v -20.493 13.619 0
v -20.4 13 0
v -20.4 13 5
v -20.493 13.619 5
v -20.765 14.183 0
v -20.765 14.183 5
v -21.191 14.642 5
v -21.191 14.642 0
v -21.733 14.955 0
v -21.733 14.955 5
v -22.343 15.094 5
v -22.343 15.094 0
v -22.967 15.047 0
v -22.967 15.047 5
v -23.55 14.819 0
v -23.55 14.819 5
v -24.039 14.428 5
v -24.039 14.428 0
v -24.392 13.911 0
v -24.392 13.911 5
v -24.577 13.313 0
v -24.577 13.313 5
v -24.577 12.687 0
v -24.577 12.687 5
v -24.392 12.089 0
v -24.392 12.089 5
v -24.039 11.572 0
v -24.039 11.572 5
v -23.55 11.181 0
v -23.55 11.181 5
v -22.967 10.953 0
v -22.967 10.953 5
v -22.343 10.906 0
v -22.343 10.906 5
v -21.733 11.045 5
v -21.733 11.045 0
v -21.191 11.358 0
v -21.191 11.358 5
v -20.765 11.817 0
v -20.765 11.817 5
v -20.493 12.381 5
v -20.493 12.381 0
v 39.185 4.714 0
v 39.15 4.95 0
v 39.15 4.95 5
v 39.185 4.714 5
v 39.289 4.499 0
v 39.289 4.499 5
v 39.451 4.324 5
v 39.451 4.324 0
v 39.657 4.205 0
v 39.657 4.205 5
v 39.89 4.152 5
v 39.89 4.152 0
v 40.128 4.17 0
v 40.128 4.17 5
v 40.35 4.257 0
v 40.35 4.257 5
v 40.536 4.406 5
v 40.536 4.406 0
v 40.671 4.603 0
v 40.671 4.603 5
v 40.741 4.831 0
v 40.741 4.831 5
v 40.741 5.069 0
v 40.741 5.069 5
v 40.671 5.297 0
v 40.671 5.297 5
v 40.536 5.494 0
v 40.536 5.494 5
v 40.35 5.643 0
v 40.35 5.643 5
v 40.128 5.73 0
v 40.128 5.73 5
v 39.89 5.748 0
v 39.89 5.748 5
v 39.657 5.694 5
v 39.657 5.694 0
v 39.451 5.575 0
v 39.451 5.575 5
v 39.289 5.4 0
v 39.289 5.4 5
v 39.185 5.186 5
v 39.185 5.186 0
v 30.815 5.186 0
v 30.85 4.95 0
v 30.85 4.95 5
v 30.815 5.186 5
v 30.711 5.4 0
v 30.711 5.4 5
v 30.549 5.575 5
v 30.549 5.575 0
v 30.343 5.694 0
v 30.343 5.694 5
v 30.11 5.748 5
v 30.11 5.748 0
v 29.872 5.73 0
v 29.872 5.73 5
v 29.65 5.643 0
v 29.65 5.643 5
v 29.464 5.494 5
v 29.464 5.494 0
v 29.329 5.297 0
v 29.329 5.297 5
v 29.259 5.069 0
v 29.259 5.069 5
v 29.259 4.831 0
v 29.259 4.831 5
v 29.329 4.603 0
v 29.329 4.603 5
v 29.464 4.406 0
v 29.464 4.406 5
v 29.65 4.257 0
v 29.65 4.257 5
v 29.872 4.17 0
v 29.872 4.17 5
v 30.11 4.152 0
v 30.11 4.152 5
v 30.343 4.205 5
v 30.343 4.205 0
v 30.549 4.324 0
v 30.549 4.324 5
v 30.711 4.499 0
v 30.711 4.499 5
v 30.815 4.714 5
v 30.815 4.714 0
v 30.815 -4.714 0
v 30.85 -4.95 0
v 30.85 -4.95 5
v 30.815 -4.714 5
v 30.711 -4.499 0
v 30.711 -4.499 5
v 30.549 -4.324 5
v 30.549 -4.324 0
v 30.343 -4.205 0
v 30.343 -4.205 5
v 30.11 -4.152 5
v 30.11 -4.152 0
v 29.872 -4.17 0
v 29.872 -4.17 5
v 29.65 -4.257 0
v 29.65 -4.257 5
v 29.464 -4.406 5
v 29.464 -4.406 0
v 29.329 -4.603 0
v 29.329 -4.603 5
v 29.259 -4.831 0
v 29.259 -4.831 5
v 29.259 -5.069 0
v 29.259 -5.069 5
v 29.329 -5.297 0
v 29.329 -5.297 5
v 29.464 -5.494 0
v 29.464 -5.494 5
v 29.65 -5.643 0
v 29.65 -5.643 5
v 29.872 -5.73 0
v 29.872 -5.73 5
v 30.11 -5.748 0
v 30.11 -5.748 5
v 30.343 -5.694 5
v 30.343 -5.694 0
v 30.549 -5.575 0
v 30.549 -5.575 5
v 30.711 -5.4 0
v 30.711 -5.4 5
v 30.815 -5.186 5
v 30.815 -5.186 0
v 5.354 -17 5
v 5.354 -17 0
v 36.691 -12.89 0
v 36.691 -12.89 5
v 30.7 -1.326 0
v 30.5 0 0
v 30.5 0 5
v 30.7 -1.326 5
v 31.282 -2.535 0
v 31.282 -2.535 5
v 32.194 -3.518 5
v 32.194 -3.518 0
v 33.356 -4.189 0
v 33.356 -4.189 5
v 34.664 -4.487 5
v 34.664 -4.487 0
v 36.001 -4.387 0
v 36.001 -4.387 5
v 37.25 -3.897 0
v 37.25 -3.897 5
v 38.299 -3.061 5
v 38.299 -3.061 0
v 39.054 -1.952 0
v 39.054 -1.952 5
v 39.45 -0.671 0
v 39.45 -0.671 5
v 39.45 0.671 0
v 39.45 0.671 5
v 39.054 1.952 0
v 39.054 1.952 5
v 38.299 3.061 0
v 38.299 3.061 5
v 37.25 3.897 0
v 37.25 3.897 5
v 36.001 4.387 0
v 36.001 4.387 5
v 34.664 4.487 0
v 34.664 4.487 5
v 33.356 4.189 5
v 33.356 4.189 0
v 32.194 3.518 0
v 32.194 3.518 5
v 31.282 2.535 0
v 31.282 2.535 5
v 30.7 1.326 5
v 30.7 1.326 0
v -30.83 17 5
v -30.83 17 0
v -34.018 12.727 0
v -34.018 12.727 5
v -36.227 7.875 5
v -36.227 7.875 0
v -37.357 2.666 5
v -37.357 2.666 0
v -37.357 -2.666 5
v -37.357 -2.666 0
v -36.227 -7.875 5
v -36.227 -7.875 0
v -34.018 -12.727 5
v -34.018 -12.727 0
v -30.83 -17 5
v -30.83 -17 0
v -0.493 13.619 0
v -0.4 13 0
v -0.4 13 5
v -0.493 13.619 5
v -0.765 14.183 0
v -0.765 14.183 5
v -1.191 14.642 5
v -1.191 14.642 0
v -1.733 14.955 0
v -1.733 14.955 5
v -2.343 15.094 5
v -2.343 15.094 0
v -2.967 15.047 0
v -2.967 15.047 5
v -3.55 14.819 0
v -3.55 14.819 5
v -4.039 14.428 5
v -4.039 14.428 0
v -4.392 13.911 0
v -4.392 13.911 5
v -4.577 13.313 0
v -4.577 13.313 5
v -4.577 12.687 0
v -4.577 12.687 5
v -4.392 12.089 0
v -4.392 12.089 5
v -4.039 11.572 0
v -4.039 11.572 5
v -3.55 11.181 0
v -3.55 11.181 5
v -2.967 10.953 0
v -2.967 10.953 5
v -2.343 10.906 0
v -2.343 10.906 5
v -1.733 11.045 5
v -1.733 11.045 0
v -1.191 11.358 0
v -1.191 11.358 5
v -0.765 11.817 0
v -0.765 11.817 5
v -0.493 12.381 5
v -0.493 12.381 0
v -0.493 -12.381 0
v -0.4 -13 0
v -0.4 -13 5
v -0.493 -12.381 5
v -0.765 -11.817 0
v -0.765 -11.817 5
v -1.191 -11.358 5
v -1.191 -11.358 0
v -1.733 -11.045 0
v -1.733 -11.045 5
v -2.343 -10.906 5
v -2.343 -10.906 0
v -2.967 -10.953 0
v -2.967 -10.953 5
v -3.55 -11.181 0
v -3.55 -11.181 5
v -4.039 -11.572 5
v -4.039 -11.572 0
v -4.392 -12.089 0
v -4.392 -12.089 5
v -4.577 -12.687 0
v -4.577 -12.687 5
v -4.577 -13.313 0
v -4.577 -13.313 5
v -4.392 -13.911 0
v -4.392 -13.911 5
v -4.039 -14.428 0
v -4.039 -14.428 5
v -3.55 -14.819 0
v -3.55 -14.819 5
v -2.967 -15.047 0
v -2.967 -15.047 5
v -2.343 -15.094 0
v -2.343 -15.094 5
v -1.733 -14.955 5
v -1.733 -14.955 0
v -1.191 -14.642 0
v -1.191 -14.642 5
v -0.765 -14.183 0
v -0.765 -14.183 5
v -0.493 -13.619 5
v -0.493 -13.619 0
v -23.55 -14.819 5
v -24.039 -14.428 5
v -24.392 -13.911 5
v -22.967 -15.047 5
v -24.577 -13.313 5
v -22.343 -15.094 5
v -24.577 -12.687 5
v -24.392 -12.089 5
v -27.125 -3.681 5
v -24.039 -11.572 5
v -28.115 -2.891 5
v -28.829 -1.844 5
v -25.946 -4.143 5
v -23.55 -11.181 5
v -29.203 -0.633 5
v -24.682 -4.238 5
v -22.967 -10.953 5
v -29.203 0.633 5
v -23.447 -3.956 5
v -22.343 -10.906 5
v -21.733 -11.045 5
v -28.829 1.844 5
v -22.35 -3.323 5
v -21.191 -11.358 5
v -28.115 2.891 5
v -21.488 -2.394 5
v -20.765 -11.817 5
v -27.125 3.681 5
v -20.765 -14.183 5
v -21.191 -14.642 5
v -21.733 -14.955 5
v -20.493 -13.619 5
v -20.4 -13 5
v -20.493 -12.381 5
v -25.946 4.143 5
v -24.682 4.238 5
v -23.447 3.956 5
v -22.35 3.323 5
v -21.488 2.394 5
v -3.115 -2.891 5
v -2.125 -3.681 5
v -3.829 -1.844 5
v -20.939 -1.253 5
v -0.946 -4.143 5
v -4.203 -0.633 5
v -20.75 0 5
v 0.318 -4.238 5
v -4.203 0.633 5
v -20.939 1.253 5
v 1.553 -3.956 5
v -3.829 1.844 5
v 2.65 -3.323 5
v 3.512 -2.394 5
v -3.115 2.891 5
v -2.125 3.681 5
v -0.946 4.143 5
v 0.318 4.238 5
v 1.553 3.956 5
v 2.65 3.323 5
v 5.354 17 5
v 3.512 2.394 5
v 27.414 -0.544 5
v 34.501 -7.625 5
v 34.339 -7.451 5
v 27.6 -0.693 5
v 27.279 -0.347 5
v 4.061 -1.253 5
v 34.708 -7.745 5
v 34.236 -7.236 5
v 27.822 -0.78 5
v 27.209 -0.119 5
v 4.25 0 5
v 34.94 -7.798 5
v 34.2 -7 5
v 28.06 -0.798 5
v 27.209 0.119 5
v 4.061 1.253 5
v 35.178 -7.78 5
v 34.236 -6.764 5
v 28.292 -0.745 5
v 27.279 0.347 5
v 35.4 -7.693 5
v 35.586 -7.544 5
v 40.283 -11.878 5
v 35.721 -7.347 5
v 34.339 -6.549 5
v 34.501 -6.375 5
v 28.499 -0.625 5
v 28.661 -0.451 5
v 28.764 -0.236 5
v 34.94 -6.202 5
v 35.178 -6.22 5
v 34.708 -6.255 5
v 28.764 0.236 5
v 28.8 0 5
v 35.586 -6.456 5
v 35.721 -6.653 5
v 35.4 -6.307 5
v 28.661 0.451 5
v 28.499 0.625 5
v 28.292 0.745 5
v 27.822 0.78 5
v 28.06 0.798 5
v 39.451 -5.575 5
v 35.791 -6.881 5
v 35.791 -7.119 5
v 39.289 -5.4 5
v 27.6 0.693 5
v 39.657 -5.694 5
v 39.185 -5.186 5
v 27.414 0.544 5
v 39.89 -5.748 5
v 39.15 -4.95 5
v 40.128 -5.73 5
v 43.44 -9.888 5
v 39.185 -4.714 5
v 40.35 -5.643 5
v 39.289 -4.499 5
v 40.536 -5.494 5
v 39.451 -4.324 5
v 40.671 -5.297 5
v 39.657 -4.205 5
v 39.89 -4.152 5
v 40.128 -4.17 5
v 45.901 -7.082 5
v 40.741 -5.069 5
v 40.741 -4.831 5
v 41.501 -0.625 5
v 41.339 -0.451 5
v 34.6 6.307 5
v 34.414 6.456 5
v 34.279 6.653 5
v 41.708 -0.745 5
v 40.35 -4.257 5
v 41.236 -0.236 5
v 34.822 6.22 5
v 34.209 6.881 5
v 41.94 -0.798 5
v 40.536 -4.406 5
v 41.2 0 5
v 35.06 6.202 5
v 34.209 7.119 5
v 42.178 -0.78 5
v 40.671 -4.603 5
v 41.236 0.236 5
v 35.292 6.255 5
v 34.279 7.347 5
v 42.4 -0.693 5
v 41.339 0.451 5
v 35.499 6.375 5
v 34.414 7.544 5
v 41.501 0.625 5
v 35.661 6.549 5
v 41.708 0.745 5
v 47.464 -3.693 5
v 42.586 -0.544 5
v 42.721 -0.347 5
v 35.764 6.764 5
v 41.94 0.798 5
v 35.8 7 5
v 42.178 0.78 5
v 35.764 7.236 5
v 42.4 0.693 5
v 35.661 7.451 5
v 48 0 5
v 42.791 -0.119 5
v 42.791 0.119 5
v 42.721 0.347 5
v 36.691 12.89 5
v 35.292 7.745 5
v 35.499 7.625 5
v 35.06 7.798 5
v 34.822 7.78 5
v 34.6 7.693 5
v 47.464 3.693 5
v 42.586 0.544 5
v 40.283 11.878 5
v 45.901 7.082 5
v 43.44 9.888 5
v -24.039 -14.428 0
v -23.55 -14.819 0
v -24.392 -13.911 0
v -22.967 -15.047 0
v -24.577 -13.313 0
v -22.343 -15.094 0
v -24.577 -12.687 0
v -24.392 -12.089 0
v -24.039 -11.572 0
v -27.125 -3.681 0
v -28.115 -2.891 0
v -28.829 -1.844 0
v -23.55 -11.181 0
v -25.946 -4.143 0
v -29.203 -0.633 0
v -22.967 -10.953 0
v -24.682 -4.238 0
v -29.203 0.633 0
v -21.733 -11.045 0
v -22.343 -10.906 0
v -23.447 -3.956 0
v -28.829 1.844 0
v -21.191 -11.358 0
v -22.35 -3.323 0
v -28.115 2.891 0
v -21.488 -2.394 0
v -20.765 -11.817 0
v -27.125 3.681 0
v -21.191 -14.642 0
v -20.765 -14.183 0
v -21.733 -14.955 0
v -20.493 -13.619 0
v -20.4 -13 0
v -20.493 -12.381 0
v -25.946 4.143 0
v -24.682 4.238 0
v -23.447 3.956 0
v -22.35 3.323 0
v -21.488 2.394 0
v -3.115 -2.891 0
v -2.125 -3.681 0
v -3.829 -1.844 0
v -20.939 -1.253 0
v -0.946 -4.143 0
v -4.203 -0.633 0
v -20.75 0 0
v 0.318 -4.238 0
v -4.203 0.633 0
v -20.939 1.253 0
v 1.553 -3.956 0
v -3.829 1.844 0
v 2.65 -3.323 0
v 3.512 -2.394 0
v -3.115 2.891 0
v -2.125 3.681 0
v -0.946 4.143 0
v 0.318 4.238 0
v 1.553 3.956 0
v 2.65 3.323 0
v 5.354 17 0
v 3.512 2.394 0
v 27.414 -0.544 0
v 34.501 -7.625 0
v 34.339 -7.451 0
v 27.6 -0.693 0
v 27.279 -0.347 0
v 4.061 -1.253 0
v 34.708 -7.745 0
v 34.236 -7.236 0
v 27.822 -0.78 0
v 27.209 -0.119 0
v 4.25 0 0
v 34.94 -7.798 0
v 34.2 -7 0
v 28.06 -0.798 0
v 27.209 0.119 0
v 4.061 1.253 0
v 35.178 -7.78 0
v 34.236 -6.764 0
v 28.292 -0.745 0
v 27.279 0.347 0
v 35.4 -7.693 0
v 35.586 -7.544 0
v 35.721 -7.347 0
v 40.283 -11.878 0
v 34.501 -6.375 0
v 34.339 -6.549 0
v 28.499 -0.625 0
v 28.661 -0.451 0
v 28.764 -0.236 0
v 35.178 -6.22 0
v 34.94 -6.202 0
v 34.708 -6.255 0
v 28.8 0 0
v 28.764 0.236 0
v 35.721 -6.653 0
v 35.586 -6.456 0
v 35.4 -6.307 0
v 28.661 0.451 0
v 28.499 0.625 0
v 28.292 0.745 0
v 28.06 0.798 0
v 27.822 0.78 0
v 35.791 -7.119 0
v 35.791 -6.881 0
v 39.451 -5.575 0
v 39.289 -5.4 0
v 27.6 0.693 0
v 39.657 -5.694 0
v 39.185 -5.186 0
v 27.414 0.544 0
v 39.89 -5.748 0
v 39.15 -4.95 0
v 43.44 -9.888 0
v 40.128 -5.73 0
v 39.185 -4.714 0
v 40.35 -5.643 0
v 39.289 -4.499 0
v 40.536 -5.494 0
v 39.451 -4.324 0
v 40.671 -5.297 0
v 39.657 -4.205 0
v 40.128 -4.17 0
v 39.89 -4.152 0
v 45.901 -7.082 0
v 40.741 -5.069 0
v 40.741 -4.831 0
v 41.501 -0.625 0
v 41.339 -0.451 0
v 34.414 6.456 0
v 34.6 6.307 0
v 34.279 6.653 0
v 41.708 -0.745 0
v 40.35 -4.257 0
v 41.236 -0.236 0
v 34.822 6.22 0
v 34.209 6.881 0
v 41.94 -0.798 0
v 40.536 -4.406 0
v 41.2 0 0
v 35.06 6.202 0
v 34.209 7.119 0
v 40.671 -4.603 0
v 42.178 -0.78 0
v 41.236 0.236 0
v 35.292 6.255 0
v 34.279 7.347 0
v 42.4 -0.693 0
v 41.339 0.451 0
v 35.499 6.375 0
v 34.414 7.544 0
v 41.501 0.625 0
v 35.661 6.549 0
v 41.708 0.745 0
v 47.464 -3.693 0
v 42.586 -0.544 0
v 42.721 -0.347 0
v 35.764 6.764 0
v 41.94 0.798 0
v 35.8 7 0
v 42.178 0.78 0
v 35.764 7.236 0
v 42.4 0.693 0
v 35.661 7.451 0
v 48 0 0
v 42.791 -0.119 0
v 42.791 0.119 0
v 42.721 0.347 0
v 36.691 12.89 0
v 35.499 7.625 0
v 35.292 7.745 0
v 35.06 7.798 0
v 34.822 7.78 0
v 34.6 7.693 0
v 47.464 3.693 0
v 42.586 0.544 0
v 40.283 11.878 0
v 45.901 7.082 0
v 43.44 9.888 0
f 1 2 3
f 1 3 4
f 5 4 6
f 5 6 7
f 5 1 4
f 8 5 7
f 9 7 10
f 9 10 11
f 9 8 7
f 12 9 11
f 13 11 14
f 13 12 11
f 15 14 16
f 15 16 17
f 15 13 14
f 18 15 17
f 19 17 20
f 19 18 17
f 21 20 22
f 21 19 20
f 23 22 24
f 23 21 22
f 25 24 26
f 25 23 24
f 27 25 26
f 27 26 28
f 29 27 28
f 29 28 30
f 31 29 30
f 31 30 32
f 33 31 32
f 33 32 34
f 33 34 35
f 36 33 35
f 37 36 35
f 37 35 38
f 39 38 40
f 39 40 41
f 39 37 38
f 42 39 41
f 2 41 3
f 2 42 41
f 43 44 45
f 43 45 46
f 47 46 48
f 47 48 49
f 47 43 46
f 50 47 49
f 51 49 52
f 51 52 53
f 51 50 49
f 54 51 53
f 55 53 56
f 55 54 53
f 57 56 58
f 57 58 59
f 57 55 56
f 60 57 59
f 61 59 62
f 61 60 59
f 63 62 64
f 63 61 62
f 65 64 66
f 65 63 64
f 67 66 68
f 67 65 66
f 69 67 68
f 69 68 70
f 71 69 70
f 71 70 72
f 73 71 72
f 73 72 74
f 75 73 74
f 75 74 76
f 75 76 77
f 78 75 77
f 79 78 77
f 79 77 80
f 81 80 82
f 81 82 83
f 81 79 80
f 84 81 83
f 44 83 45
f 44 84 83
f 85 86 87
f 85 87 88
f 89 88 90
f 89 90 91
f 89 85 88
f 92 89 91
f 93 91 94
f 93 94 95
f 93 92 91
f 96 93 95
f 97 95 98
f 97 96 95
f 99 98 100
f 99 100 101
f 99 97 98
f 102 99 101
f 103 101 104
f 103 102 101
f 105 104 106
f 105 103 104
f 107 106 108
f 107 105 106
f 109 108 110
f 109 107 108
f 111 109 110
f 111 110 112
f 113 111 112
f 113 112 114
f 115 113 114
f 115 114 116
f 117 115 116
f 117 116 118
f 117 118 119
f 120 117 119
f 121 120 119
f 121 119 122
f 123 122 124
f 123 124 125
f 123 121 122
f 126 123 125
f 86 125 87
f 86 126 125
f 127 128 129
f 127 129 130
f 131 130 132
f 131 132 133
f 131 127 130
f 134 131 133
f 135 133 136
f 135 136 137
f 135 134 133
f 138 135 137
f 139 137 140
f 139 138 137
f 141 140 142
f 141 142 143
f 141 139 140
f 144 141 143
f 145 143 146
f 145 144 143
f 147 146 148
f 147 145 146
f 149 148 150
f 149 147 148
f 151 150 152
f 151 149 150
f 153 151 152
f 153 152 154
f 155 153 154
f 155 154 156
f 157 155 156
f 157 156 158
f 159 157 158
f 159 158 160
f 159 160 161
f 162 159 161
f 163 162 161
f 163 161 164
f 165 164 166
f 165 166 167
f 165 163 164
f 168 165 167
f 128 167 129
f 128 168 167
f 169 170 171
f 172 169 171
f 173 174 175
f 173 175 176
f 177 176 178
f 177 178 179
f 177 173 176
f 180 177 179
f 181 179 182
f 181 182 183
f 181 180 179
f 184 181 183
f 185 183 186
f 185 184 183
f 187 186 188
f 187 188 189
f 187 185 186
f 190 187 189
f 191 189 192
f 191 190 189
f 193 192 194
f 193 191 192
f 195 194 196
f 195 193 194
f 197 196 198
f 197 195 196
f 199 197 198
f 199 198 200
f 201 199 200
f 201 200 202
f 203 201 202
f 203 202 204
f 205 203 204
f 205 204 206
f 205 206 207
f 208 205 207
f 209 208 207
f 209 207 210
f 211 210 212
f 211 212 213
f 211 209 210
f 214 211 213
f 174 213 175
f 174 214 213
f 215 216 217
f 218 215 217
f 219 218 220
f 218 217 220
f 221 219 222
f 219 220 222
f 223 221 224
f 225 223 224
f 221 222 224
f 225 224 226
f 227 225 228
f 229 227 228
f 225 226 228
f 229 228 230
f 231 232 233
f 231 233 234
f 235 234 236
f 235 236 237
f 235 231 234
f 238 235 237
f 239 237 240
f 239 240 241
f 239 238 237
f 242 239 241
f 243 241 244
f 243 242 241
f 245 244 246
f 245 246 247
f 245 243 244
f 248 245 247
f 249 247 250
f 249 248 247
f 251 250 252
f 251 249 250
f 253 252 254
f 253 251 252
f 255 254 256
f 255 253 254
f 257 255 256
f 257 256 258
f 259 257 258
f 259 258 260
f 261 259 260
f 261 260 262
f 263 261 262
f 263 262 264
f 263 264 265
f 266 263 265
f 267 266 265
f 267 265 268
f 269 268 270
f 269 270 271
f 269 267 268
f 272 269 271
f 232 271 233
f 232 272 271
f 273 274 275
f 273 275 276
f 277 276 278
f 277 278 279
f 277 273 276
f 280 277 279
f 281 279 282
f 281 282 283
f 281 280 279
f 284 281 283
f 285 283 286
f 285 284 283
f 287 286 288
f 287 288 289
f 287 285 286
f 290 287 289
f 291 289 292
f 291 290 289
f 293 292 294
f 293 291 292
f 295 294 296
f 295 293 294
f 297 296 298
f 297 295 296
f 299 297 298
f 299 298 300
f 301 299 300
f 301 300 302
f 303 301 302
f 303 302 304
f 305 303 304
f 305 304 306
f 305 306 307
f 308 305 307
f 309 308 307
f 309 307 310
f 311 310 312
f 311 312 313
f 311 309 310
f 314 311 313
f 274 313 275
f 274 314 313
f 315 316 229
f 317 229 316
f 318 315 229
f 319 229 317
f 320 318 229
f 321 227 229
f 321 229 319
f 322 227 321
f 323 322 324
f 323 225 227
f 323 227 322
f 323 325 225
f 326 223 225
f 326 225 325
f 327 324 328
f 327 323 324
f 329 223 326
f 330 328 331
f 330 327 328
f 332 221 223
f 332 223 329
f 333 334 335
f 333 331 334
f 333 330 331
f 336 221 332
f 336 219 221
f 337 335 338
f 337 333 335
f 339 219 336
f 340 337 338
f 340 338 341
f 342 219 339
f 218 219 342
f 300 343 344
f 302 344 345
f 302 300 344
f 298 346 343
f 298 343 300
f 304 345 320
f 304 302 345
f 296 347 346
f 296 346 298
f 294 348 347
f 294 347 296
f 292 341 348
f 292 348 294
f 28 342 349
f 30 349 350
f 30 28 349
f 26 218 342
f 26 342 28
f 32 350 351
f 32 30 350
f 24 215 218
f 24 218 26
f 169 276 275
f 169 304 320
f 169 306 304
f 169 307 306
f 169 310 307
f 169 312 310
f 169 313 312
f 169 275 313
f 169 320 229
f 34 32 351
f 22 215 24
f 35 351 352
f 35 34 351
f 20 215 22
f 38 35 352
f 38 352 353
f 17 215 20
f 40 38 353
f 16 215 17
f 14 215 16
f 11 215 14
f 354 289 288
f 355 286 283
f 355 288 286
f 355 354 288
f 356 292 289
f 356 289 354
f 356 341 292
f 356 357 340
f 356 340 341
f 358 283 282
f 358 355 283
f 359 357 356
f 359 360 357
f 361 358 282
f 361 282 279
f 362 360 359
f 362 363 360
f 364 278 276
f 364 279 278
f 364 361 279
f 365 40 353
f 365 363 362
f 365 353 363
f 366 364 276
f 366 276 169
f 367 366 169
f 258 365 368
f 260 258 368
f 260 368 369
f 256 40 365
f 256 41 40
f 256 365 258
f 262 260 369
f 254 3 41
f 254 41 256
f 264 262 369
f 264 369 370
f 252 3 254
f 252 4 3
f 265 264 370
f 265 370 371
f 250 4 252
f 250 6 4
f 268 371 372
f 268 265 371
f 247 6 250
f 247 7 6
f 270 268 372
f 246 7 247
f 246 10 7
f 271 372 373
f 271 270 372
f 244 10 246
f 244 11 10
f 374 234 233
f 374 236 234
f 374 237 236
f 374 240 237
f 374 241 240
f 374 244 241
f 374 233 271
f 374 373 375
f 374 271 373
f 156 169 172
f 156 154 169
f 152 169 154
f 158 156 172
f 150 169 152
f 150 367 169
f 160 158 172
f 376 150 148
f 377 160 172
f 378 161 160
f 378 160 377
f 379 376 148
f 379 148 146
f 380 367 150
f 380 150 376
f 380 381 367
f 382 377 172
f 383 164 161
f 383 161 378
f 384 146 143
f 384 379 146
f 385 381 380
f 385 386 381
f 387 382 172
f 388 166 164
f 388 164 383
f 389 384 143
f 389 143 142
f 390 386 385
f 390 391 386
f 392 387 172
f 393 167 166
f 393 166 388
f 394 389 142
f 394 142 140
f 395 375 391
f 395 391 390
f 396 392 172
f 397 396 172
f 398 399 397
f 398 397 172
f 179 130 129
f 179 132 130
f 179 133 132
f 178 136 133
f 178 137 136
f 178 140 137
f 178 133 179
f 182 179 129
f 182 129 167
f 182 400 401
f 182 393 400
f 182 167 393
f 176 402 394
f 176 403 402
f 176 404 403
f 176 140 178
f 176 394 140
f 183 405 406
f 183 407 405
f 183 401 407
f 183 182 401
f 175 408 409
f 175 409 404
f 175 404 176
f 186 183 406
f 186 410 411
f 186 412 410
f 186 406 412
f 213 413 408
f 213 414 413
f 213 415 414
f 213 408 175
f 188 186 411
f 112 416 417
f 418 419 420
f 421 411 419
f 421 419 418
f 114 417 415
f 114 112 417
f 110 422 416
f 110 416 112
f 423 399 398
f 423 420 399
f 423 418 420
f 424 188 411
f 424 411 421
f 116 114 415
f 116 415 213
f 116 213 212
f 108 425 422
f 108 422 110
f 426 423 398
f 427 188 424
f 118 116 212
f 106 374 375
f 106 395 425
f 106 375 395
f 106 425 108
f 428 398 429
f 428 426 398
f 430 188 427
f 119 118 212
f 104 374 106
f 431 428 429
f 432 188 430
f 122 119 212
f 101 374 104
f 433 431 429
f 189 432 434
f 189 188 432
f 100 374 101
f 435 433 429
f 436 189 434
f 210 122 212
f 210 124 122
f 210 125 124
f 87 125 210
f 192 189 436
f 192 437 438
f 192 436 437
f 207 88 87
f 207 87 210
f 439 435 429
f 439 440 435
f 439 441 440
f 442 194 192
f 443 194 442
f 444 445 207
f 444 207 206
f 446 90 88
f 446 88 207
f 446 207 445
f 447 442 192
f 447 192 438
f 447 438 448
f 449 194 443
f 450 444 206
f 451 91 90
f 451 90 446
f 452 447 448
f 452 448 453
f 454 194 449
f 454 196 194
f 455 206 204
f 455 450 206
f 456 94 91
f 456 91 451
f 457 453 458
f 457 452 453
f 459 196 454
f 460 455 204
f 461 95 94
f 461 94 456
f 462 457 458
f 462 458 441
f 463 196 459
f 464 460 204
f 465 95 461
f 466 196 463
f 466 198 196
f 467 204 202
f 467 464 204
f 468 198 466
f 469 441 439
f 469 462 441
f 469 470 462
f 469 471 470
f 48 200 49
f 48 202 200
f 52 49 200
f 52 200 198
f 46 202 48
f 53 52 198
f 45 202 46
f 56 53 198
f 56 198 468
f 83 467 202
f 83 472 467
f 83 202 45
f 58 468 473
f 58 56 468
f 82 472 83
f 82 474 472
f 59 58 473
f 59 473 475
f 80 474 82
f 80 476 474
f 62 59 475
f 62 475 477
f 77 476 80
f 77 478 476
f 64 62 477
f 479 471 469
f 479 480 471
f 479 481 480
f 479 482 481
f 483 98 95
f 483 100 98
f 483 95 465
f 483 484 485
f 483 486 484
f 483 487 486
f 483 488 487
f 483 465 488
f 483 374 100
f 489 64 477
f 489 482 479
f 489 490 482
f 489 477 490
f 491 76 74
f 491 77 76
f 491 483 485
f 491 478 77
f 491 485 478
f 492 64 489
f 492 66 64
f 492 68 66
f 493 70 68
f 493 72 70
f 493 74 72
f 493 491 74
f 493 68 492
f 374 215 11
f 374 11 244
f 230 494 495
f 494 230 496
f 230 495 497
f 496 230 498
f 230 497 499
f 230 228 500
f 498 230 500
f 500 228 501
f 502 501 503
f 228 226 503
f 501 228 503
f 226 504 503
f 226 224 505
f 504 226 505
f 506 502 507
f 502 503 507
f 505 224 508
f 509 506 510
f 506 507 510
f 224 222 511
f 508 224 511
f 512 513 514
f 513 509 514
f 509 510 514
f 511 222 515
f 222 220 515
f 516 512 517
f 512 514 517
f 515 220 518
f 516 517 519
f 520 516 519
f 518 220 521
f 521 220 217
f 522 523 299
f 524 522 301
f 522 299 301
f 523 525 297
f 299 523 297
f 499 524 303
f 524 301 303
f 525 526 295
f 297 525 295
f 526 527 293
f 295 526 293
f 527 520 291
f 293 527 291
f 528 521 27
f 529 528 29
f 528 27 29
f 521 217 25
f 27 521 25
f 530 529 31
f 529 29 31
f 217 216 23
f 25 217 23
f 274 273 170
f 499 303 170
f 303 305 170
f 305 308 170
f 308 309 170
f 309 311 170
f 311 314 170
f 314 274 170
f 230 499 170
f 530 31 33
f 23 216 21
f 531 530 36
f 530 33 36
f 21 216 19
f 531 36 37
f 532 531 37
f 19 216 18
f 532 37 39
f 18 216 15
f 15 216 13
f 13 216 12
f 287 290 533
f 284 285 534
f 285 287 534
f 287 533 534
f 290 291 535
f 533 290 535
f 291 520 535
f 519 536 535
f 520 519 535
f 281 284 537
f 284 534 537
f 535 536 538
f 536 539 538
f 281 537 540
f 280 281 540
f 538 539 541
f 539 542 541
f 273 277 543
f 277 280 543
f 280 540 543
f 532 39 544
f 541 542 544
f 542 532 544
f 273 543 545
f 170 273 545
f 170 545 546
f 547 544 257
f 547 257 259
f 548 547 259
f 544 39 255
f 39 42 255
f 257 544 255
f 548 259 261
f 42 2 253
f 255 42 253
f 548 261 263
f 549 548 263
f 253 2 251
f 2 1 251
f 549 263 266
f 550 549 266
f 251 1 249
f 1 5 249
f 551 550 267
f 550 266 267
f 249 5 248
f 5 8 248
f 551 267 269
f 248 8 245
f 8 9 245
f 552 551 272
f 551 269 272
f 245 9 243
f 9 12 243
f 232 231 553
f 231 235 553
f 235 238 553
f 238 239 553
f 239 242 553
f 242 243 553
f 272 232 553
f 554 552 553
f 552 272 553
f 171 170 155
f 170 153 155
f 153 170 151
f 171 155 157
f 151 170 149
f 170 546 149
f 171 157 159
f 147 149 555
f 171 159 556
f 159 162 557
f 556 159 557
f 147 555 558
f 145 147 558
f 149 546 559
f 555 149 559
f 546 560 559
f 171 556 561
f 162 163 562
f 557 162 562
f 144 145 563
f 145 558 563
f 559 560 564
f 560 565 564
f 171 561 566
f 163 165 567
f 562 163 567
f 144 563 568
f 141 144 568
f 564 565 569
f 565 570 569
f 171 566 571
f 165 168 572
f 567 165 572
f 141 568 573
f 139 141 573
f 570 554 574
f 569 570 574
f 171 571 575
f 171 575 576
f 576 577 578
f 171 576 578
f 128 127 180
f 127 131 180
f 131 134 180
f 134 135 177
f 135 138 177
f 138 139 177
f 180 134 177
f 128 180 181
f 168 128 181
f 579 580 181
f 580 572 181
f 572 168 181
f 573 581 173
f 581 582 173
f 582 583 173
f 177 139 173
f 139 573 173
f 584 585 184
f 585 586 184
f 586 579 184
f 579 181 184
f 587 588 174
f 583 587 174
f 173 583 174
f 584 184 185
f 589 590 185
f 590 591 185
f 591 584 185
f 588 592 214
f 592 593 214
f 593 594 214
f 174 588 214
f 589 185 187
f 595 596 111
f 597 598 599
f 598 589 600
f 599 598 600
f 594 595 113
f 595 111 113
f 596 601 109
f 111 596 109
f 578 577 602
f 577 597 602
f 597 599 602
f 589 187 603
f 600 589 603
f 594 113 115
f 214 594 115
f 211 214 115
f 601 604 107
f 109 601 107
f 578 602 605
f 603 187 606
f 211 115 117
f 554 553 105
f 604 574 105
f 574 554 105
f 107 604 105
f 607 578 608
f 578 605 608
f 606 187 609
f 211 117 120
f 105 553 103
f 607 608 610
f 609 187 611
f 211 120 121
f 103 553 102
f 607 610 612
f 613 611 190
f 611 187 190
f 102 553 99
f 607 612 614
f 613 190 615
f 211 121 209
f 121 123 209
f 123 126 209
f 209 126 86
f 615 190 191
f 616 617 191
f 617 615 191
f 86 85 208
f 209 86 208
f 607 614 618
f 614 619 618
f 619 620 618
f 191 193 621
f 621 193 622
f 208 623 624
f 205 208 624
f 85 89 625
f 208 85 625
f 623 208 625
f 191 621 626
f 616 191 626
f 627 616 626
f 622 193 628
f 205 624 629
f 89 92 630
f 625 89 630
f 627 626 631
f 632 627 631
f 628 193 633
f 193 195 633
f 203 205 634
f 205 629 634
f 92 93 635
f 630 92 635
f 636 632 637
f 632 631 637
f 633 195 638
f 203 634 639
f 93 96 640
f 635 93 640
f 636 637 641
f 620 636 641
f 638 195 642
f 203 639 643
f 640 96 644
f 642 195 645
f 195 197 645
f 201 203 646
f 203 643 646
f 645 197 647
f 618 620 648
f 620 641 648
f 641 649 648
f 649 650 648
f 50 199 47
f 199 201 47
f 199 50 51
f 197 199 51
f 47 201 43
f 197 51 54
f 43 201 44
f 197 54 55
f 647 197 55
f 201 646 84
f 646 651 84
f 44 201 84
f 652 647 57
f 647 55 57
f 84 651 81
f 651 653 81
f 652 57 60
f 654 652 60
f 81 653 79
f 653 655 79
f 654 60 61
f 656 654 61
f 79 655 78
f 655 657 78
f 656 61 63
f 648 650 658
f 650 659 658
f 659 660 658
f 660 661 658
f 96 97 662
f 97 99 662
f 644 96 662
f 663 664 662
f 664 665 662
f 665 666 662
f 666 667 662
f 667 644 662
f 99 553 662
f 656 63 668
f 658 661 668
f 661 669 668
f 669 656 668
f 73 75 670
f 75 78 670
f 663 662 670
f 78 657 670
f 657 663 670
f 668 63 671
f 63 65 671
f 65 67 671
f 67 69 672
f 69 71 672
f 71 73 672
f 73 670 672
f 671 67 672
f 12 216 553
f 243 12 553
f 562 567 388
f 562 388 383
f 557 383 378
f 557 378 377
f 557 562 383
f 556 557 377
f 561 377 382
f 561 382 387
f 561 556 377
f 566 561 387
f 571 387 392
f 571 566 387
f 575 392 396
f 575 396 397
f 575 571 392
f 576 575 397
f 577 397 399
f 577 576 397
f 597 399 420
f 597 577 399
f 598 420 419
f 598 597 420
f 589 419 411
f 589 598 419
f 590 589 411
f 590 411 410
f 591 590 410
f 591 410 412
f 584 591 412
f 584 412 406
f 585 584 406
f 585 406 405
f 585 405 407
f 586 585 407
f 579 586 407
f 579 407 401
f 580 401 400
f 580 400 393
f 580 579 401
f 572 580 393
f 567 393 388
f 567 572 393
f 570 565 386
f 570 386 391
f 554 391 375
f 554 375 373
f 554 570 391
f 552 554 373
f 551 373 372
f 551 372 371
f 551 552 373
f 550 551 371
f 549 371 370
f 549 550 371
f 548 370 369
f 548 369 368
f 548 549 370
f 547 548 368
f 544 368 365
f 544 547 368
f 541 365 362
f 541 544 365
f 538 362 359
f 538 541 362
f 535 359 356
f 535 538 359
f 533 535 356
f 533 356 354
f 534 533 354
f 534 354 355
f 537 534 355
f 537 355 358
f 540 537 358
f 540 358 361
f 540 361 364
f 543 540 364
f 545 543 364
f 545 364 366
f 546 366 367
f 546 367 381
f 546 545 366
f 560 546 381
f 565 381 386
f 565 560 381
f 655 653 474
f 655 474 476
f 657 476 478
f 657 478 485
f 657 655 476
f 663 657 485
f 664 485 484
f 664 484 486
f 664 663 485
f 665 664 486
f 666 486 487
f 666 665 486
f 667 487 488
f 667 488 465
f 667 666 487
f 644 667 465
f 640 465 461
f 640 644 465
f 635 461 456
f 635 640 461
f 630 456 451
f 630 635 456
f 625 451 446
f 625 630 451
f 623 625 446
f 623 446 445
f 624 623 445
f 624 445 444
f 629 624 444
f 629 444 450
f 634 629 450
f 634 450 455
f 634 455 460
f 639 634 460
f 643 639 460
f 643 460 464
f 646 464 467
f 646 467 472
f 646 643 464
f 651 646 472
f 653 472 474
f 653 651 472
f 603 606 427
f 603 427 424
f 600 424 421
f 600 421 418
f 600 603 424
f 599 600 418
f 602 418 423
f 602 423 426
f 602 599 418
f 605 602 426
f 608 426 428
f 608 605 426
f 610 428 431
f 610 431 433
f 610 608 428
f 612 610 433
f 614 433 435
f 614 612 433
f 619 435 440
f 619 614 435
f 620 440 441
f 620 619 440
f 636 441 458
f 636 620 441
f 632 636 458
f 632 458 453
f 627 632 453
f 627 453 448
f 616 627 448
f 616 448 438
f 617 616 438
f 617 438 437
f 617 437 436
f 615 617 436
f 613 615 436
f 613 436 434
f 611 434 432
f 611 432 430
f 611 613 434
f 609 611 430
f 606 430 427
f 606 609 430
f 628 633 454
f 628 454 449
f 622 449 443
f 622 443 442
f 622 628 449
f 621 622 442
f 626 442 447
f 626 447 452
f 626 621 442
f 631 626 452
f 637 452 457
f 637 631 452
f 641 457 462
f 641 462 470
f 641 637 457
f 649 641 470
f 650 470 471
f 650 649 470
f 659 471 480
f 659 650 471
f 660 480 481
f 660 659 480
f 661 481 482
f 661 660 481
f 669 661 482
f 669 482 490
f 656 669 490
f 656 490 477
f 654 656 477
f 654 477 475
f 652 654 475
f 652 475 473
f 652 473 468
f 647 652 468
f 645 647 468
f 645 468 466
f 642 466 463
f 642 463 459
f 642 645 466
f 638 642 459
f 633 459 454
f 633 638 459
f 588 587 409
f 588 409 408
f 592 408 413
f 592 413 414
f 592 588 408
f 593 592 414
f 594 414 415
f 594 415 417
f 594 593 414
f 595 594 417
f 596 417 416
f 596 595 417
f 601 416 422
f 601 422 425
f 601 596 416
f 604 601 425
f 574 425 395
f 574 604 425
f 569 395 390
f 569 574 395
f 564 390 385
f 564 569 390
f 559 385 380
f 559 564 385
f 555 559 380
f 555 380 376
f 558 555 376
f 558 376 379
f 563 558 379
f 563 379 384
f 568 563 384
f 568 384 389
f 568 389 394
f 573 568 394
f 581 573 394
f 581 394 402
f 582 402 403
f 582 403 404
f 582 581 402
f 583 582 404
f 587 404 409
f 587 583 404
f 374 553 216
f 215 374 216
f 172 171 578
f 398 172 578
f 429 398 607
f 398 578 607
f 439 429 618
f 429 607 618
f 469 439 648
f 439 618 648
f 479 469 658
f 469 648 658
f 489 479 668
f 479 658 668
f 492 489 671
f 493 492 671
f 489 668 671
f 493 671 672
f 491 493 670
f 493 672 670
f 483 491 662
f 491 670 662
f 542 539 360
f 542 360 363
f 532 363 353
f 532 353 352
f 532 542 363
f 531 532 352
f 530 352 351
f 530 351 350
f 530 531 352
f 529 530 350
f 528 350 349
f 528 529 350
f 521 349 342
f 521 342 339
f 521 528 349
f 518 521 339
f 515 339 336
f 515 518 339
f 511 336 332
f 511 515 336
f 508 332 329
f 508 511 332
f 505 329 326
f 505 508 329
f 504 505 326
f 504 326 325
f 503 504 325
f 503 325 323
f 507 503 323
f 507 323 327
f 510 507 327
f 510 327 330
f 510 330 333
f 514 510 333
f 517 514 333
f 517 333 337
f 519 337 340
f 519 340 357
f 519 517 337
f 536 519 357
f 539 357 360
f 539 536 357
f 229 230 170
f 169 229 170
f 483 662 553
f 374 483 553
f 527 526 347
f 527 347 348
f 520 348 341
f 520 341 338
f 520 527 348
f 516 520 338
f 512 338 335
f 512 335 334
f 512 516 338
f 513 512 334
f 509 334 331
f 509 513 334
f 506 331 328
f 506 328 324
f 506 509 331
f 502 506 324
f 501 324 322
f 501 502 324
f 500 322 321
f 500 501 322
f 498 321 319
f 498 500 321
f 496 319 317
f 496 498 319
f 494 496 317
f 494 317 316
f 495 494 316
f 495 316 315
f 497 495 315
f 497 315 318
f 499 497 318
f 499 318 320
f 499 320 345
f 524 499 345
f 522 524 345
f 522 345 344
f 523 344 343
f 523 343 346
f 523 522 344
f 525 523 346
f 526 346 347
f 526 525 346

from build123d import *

# Parameters (mm, degrees)
SKETCH1_R           = 2.1
SKETCH1_R_2         = 4.25
BOSS_EXTRUDE1_DEPTH = 5


with BuildPart() as part:
    # Sketch1 → Boss-Extrude1 (new body)
    # profile 1 of 2: a face of its own
    with BuildSketch(Plane.XY):
        with BuildLine():
            Line((5.353571071, -17), (36.690694186, -12.889590884))
            ThreePointArc((36.690694186, -12.889590884), (48, 0), (36.690694186, 12.889590884))
            Line((36.690694186, 12.889590884), (5.353571071, 17))
            Line((5.353571071, 17), (-30.83030278, 17))
            ThreePointArc((-30.83030278, 17), (-37.5, 0), (-30.83030278, -17))
            Line((-30.83030278, -17), (5.353571071, -17))
        make_face()
        with Locations((-22.5, 13)):
            Circle(SKETCH1_R, mode=Mode.SUBTRACT)
        with Locations((-2.5, 13)):
            Circle(SKETCH1_R, mode=Mode.SUBTRACT)
        Circle(SKETCH1_R_2, mode=Mode.SUBTRACT)
        with Locations((-25, 0)):
            Circle(SKETCH1_R_2, mode=Mode.SUBTRACT)
        with Locations((-22.5, -13)):
            Circle(SKETCH1_R, mode=Mode.SUBTRACT)
        with Locations((-2.5, -13)):
            Circle(SKETCH1_R, mode=Mode.SUBTRACT)
        with BuildLine():
            ThreePointArc((44.5, 0), (35, 9.5), (25.5, 0))
            ThreePointArc((25.5, 0), (35, -9.5), (44.5, 0))
        make_face(mode=Mode.SUBTRACT)
    # profile 2 of 2: a face of its own
    with BuildSketch(Plane.XY):
        with BuildLine():
            ThreePointArc((25.5, 0), (35, -9.5), (44.5, 0))
            ThreePointArc((44.5, 0), (35, 9.5), (25.5, 0))
        make_face()
        with BuildLine():
            ThreePointArc((34.2, 7), (35, 6.2), (35.8, 7))
            ThreePointArc((35.8, 7), (35, 7.8), (34.2, 7))
        make_face(mode=Mode.SUBTRACT)
        with BuildLine():
            ThreePointArc((40.749747468, 4.949747468), (39.949747468, 5.749747468), (39.149747468, 4.949747468))
            ThreePointArc((39.149747468, 4.949747468), (39.949747468, 4.149747468), (40.749747468, 4.949747468))
        make_face(mode=Mode.SUBTRACT)
        with BuildLine():
            ThreePointArc((42.8, 0), (42, 0.8), (41.2, 0))
            ThreePointArc((41.2, 0), (42, -0.8), (42.8, 0))
        make_face(mode=Mode.SUBTRACT)
        with BuildLine():
            ThreePointArc((40.749747468, -4.949747468), (39.949747468, -4.149747468), (39.149747468, -4.949747468))
            ThreePointArc((39.149747468, -4.949747468), (39.949747468, -5.749747468), (40.749747468, -4.949747468))
        make_face(mode=Mode.SUBTRACT)
        with BuildLine():
            ThreePointArc((35.8, -7), (35, -6.2), (34.2, -7))
            ThreePointArc((34.2, -7), (35, -7.8), (35.8, -7))
        make_face(mode=Mode.SUBTRACT)
        with BuildLine():
            ThreePointArc((29.250252532, -4.949747468), (30.050252532, -5.749747468), (30.850252532, -4.949747468))
            ThreePointArc((30.850252532, -4.949747468), (30.050252532, -4.149747468), (29.250252532, -4.949747468))
        make_face(mode=Mode.SUBTRACT)
        with BuildLine():
            ThreePointArc((27.2, 0), (28, -0.8), (28.8, 0))
            ThreePointArc((28.8, 0), (28, 0.8), (27.2, 0))
        make_face(mode=Mode.SUBTRACT)
        with BuildLine():
            ThreePointArc((29.250252532, 4.949747468), (30.050252532, 4.149747468), (30.850252532, 4.949747468))
            ThreePointArc((30.850252532, 4.949747468), (30.050252532, 5.749747468), (29.250252532, 4.949747468))
        make_face(mode=Mode.SUBTRACT)
        with BuildLine():
            ThreePointArc((39.5, 0), (35, 4.5), (30.5, 0))
            ThreePointArc((30.5, 0), (35, -4.5), (39.5, 0))
        make_face(mode=Mode.SUBTRACT)
    extrude(amount=BOSS_EXTRUDE1_DEPTH)


solid = part.part
